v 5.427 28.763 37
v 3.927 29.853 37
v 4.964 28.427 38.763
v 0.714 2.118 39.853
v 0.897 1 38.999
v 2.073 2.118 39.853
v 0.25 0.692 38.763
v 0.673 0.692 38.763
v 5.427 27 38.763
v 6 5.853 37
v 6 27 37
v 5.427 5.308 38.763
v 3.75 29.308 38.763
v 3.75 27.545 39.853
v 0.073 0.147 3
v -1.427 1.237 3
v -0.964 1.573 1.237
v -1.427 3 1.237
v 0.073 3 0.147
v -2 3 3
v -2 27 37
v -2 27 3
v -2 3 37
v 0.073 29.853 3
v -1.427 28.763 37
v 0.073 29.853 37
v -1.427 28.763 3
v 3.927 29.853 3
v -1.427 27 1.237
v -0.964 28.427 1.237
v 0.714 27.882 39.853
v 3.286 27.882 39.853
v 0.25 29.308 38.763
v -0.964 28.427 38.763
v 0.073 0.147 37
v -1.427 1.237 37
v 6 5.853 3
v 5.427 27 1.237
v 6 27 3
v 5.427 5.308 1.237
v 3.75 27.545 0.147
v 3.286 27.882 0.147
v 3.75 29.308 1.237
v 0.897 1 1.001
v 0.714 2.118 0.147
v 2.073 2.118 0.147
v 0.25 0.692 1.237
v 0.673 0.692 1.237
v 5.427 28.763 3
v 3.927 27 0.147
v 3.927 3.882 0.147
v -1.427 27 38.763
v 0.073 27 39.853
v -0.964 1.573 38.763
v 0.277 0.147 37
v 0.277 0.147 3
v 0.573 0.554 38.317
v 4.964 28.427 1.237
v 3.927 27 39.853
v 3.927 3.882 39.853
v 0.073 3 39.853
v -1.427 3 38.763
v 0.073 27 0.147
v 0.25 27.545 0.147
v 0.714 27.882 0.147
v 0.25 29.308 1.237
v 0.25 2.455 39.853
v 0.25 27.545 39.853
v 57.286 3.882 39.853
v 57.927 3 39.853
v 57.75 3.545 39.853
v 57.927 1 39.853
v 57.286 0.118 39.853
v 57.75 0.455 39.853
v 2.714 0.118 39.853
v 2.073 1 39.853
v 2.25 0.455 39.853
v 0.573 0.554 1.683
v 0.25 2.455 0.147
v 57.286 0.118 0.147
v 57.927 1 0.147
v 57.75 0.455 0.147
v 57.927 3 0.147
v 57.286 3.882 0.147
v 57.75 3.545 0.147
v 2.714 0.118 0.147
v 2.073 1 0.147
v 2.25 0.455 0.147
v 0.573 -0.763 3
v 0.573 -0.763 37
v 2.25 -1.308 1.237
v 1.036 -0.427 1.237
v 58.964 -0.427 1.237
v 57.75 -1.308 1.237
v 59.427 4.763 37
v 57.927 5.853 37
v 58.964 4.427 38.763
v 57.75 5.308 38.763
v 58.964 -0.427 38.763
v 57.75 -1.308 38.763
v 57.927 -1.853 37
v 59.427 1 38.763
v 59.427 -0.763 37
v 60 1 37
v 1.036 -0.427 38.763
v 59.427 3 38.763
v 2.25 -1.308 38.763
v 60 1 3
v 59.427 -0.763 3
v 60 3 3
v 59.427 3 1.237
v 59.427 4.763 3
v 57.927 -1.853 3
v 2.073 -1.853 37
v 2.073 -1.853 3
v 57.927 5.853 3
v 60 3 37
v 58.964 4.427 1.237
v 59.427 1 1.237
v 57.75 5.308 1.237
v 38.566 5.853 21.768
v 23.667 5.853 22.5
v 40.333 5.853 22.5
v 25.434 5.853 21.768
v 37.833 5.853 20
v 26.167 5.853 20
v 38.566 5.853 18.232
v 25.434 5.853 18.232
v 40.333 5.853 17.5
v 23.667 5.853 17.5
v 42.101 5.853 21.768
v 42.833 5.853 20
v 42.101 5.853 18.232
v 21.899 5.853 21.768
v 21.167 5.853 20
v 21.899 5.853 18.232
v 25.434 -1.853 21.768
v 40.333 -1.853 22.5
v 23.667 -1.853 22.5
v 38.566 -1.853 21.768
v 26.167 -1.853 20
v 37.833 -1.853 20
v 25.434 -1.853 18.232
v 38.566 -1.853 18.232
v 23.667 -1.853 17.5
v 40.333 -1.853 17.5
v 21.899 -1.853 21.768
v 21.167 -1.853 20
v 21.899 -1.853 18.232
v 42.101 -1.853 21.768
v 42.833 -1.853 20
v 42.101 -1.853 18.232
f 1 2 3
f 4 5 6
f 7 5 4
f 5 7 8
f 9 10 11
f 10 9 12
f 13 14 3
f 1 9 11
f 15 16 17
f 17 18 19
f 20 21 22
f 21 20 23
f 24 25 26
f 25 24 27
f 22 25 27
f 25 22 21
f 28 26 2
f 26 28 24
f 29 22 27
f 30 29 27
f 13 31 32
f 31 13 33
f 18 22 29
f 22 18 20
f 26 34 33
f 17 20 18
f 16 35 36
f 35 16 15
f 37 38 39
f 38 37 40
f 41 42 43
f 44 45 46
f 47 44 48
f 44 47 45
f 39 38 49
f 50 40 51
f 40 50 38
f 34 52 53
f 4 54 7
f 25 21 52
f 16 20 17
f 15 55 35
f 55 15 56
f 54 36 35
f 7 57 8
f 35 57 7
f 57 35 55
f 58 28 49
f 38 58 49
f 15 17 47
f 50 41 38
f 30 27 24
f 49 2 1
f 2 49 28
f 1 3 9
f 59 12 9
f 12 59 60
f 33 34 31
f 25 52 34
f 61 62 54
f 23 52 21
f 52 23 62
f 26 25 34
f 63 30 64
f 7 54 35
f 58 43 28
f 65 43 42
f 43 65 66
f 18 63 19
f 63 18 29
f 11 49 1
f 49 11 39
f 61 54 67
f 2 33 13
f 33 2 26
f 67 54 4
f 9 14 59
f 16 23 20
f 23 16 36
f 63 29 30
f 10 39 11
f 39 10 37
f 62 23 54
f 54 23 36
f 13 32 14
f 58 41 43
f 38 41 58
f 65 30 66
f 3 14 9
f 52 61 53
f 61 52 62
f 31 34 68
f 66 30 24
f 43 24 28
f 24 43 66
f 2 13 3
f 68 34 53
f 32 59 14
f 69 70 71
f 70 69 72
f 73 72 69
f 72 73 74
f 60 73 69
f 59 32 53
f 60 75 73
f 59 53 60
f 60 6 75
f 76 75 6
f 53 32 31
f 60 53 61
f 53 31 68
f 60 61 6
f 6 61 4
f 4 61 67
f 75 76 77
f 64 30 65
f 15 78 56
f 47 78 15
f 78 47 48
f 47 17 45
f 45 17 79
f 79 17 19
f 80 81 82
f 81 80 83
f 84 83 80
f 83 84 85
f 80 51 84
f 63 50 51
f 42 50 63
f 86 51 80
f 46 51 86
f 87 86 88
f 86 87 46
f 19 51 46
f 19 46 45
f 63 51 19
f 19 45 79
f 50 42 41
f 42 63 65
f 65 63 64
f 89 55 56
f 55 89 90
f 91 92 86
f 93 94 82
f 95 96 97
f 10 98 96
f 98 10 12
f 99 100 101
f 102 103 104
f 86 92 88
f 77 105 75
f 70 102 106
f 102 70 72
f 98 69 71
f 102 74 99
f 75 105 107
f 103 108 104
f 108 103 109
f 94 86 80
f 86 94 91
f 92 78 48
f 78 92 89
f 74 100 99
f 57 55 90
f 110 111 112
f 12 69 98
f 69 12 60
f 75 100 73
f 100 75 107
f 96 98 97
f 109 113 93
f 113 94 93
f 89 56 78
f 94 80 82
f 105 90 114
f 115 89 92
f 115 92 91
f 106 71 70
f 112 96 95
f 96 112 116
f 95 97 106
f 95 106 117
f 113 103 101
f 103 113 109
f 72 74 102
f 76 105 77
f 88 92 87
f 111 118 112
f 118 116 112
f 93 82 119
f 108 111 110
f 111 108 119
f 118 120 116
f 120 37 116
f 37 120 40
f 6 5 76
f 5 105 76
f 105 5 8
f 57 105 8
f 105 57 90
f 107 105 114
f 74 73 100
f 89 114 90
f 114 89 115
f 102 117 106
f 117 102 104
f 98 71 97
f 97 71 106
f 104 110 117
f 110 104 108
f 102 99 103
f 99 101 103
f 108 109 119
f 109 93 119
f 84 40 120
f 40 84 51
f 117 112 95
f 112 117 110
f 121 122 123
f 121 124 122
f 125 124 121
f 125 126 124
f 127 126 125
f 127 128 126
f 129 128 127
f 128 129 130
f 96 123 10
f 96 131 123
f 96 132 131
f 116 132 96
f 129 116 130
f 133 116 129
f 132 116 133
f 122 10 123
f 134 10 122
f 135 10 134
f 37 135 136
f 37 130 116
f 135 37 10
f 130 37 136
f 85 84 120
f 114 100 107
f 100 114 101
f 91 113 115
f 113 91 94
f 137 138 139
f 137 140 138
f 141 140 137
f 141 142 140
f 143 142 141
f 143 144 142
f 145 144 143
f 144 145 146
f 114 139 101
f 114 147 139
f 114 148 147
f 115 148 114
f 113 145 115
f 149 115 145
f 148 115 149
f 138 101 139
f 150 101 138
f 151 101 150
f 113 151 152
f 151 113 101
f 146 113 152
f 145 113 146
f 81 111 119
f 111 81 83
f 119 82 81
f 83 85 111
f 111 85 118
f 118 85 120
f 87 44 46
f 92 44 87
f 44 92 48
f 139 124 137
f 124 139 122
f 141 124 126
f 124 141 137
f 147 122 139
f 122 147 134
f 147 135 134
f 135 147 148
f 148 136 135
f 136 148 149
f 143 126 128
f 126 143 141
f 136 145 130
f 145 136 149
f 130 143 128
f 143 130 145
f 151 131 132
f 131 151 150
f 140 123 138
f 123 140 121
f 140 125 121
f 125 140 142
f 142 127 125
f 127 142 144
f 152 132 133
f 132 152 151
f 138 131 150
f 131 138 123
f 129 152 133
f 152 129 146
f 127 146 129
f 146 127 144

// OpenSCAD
// Parametric L-bracket
L = 60; W = 30; T = 4; H1 = 40; H2 = 40; D = 5; N = 2; R = 3;

module rounded_cube(dim, r) {
    hull() {
        for (x = [r, dim[0]-r], y = [r, dim[1]-r], z = [r, dim[2]-r]) {
            translate([x, y, z]) sphere(r=r);
        }
    }
}

module l_bracket() {
    difference() {
        union() {
            rounded_cube([T, W, H1], R);
            rounded_cube([L, T, H2], R);
        }
        spacing = (L - T - 2*R) / (N + 1);
        for (i = [1:N]) {
            x_pos = T + R + i * spacing;
            translate([x_pos, T/2, H1/2])
                rotate([90, 0, 0]) cylinder(d=D, h=W+2, center=true);
        }
    }
}

l_bracket();
